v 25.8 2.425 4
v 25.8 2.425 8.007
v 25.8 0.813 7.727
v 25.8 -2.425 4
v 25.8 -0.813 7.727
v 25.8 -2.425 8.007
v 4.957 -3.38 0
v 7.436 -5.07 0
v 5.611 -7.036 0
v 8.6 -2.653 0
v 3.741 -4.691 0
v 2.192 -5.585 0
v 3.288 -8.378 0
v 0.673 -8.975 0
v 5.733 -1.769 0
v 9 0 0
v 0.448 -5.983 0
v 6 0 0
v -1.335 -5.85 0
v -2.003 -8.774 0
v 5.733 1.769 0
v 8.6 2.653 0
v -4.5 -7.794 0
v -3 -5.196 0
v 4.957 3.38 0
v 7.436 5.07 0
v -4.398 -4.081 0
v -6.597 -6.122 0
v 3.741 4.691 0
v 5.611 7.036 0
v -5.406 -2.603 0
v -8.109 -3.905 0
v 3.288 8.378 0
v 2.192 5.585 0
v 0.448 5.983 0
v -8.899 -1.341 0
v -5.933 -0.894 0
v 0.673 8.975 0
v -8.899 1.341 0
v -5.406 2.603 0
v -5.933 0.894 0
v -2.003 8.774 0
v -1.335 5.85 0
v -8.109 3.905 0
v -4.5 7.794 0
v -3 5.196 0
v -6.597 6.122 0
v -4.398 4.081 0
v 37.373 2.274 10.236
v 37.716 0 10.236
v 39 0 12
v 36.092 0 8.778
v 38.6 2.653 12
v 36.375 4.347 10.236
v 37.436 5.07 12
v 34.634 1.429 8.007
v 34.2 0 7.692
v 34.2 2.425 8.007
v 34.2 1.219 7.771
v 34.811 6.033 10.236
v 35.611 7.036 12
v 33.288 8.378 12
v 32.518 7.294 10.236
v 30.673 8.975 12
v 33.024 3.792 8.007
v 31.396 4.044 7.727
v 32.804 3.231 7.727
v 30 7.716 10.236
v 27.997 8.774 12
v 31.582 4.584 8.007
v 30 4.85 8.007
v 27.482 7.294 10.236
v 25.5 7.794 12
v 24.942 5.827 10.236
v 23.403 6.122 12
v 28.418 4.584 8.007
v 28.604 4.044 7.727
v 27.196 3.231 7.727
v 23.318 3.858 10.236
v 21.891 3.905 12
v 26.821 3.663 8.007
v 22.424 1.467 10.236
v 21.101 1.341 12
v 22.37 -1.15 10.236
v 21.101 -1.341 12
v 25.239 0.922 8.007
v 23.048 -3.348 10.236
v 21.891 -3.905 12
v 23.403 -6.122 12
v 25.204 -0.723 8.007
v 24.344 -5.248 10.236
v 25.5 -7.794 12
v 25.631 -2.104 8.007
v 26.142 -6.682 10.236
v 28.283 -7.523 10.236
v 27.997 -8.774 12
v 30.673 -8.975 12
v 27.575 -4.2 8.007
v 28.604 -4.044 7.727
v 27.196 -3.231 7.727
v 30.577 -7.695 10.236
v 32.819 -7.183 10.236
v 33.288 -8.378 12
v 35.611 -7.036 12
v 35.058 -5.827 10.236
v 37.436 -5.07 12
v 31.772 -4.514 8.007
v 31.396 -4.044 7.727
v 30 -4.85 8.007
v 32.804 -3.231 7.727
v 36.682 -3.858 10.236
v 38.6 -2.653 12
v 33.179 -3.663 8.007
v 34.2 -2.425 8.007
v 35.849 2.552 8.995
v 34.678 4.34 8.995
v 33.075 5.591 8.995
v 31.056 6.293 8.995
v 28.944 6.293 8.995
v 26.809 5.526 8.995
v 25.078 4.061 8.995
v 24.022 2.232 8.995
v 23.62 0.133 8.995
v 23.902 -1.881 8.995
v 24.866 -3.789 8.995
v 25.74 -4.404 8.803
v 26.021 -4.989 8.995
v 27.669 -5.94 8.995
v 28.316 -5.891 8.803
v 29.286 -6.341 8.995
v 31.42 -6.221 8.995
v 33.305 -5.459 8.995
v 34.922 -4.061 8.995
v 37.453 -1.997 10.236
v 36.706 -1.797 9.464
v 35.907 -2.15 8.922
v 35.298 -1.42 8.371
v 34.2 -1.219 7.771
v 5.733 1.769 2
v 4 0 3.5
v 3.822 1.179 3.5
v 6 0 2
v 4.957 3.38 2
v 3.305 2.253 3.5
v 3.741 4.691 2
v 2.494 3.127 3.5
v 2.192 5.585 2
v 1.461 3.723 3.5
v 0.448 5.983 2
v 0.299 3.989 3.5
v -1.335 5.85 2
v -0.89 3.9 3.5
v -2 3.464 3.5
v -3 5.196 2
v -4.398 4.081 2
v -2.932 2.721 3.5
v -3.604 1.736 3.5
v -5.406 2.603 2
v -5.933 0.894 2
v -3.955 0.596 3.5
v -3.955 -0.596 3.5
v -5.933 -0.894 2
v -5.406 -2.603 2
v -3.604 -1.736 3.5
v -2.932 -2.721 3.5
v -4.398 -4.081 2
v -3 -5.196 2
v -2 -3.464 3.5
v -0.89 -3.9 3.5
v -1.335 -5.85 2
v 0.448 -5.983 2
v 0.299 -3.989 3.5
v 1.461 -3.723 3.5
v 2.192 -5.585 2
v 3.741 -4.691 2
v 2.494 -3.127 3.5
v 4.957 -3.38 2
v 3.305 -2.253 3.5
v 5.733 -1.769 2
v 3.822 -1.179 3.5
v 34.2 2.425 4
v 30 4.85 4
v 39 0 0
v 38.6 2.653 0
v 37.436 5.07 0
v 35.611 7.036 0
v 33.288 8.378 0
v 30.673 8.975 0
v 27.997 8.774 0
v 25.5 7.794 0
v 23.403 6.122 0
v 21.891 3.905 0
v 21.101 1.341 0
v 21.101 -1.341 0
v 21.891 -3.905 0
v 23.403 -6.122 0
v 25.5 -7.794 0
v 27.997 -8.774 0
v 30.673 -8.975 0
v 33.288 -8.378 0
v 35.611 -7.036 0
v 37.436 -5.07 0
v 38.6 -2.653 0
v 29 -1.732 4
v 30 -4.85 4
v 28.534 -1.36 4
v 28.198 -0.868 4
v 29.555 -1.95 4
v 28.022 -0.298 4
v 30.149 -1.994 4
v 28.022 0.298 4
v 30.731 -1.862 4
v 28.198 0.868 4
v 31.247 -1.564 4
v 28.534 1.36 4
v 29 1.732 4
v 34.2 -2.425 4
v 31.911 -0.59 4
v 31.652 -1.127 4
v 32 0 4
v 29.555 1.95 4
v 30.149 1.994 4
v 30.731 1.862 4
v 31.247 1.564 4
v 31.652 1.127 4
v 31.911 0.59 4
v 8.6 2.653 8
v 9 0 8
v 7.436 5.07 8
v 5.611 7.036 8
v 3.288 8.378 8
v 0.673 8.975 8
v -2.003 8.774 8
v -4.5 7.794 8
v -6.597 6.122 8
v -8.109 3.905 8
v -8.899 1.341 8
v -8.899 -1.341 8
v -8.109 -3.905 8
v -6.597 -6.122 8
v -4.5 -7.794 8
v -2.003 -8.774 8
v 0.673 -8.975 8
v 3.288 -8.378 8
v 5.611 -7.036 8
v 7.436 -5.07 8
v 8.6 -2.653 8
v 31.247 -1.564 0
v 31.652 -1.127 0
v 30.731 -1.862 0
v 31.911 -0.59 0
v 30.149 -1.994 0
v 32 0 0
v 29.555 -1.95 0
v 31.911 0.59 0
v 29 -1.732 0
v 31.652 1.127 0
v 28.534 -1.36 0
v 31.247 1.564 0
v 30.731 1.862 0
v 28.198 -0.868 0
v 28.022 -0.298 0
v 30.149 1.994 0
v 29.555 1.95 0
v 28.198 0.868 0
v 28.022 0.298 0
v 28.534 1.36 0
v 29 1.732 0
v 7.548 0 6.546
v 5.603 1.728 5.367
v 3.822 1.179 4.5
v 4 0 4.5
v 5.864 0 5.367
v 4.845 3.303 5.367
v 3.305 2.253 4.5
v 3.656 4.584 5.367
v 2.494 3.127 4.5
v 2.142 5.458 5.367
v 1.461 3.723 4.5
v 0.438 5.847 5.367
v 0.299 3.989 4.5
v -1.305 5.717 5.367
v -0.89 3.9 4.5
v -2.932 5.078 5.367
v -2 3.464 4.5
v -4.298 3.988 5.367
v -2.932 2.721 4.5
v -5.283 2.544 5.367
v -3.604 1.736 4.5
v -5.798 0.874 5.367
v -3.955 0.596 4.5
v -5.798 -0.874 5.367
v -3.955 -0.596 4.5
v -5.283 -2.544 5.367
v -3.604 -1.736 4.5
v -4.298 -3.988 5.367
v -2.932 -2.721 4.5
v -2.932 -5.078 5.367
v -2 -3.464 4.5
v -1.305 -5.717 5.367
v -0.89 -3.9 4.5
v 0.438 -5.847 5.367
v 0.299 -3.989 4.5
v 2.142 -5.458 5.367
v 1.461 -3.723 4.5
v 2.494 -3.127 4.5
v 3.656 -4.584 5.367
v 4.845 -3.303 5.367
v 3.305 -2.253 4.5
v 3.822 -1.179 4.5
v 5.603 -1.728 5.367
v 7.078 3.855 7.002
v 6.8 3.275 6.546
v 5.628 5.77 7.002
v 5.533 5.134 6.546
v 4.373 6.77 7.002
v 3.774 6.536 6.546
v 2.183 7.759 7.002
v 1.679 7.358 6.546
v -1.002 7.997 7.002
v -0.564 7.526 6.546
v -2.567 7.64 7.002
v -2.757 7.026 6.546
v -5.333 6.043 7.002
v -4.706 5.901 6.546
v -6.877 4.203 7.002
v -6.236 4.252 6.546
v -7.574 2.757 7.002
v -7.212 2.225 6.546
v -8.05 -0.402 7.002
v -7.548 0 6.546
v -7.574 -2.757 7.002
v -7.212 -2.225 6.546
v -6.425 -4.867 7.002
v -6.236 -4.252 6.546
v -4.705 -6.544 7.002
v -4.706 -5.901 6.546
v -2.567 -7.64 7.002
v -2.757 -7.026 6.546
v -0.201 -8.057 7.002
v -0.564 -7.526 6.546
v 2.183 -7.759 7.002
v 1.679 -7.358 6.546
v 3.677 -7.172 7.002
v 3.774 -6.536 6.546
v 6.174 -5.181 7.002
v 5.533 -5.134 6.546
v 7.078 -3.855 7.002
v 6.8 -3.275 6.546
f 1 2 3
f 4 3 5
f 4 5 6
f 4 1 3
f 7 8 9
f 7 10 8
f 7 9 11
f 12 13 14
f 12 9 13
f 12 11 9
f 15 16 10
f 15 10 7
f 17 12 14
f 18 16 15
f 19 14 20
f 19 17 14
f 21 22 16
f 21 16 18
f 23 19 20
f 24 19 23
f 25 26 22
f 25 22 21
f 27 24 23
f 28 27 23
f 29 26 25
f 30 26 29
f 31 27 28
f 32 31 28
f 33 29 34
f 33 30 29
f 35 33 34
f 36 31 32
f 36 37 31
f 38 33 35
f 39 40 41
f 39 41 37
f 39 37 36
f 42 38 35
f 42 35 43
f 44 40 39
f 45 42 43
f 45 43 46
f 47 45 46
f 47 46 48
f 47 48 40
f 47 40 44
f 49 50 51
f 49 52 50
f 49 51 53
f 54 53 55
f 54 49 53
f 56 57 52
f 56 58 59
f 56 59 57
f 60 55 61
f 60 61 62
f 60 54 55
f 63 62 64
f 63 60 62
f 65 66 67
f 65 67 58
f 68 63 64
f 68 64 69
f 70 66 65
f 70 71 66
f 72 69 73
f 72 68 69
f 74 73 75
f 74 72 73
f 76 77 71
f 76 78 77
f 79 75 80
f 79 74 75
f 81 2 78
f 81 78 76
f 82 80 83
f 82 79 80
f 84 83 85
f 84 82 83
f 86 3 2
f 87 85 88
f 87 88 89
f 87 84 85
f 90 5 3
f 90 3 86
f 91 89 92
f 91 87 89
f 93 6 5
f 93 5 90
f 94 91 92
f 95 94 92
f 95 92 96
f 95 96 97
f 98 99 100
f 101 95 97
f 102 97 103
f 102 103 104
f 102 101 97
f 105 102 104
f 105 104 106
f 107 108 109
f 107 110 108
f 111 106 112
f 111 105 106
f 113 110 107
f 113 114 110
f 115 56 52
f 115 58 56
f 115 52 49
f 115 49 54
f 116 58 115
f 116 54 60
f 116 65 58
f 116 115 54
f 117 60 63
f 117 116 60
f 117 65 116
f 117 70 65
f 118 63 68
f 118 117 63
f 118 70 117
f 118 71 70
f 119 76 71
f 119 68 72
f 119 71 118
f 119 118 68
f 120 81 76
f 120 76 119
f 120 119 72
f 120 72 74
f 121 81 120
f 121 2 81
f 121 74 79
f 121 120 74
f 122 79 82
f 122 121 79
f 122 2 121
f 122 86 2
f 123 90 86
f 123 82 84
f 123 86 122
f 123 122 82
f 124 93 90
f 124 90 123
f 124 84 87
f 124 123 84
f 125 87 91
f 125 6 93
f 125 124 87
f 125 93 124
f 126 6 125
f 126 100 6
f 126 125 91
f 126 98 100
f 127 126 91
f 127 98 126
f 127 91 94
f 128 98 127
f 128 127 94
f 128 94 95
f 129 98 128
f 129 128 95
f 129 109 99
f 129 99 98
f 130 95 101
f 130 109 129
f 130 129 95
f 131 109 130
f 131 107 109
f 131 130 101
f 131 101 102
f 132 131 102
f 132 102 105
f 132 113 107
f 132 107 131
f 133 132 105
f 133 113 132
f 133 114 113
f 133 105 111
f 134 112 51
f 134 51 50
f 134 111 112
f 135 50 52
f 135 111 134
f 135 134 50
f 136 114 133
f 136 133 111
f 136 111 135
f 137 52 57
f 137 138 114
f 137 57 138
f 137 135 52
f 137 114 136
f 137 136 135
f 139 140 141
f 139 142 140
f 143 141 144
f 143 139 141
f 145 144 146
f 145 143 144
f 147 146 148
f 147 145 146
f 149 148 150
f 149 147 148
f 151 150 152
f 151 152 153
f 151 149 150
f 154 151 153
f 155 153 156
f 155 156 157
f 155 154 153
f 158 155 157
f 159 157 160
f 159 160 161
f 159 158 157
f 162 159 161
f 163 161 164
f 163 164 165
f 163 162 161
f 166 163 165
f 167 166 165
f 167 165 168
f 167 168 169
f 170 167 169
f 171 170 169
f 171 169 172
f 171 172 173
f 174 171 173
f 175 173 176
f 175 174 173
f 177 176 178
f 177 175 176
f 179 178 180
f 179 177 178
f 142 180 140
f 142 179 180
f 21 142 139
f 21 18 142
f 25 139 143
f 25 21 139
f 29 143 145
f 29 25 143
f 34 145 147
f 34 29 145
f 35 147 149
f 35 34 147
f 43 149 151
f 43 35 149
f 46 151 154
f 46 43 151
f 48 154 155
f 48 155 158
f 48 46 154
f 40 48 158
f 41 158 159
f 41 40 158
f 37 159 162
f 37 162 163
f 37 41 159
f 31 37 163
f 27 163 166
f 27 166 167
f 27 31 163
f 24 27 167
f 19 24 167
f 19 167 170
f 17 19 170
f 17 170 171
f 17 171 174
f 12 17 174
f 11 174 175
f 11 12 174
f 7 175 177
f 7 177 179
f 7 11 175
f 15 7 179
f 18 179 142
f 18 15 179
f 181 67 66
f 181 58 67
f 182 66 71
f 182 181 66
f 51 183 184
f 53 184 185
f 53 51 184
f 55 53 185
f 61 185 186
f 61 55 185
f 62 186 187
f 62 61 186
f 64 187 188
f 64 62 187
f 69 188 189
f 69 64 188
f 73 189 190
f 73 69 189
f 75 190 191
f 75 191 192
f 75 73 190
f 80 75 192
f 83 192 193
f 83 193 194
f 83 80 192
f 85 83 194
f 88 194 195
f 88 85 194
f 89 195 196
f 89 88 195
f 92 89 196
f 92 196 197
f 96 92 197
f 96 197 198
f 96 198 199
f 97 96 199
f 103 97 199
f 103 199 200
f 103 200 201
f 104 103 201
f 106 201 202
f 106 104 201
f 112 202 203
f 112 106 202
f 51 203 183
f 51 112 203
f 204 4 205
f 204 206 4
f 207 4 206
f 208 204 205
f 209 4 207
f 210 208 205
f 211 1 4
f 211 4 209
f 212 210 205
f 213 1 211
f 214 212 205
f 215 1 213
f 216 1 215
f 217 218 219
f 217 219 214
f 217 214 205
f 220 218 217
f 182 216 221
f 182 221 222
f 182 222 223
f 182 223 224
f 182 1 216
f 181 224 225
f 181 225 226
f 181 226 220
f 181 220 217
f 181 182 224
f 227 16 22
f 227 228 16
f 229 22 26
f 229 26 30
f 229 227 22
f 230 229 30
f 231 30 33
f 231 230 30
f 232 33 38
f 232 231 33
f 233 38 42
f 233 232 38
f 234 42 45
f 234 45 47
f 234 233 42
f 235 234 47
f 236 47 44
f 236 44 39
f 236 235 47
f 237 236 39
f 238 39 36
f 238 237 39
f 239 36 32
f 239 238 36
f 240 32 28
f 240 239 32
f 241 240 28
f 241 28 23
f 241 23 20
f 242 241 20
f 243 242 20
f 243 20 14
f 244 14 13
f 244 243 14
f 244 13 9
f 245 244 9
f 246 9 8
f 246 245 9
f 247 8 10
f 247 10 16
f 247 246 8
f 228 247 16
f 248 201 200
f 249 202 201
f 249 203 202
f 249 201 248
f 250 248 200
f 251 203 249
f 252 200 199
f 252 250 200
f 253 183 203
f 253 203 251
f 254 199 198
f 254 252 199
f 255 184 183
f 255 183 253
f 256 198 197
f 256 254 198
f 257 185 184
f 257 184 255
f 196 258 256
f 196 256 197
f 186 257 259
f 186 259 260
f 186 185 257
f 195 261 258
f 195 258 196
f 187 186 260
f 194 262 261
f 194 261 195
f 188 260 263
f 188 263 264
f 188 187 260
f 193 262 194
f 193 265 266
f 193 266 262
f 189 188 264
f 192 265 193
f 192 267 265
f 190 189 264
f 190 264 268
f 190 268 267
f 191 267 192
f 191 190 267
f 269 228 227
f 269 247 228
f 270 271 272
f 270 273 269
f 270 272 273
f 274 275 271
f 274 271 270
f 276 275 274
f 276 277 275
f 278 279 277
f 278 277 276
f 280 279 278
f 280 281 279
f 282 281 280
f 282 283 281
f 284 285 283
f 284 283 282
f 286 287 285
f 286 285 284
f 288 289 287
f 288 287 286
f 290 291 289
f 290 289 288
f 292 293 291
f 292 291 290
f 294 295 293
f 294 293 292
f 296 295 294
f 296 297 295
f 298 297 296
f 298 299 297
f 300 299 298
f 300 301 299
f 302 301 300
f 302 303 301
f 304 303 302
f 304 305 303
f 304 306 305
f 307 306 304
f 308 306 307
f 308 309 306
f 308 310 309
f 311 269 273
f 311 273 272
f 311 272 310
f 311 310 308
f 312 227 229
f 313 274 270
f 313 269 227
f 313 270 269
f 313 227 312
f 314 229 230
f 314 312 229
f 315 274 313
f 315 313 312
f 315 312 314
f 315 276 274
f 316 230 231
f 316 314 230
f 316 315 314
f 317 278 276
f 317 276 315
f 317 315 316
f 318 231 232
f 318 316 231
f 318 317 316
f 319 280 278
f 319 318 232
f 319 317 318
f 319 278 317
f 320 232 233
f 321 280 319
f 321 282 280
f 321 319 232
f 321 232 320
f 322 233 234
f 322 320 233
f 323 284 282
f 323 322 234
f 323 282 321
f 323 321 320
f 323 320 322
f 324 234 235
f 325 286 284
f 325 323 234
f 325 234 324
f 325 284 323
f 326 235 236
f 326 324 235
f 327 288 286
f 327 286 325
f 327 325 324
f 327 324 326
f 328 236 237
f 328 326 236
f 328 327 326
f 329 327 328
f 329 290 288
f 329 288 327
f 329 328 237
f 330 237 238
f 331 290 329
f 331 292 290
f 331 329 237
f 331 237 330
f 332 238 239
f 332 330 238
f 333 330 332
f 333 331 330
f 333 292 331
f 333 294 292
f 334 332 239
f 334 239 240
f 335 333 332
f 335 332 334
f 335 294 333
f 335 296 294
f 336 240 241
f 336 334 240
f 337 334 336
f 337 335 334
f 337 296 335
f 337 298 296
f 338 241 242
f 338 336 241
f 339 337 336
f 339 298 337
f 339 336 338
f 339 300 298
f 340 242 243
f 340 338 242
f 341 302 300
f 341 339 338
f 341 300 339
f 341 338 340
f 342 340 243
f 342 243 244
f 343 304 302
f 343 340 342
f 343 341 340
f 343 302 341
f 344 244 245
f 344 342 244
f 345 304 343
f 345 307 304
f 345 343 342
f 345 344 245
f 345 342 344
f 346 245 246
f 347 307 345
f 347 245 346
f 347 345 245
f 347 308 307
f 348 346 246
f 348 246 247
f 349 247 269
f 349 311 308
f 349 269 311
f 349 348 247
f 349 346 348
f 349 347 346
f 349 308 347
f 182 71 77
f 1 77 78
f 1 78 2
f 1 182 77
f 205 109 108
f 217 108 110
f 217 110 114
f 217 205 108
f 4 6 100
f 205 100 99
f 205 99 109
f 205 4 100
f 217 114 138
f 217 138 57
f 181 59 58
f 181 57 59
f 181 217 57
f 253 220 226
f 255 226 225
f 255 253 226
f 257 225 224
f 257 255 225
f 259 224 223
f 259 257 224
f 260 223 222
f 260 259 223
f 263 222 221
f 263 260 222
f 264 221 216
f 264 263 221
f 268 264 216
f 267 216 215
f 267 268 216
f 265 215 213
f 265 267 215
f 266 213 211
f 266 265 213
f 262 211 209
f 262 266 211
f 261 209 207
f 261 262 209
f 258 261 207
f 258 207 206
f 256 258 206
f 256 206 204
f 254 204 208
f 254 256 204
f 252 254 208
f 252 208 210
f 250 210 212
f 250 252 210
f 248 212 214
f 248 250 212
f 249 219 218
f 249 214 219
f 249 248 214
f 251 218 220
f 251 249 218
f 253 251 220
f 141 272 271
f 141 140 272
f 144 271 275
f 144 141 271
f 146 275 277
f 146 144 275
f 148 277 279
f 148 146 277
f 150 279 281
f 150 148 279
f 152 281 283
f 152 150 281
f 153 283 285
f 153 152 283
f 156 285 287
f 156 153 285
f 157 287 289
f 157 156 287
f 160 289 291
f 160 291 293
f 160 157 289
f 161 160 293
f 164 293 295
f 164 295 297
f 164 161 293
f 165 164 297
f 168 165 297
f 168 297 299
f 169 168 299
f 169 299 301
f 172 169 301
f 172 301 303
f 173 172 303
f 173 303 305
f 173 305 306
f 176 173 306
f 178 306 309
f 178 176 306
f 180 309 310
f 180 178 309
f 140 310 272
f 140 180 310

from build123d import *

# Parameters (mm, degrees)
F7_DEPTH = 5


with BuildPart() as f2:
    # F0 (on Front) → F2 (revolve)
    with BuildSketch(Plane.XZ):
        with BuildLine():
            Line((6, 2), (6, 0))
            Line((6, 0), (9, 0))
            Line((9, 0), (9, 8))
            ThreePointArc((9, 8), (6.731456, 5.919349), (4, 4.5))
            Line((4, 4.5), (4, 3.5))
            Line((4, 3.5), (6, 2))
        make_face()
    revolve(axis=Axis((0, 0, 8.674054), (0, 0, 1)))


with BuildPart() as f5:
    # F4 (on Front) → F5 (revolve)
    with BuildSketch(Plane.XZ):
        with BuildLine():
            Line((32, 7), (32, 0))
            Line((32, 0), (39, 0))
            Line((39, 0), (39, 12))
            ThreePointArc((39, 12), (36.041523, 8.741868), (32, 7))
        make_face()
    revolve(axis=Axis((30, 0, 15), (0, 0, 1)))


with BuildPart() as f7:
    # F6 (on Top) → F7 (new body)
    with BuildSketch(Plane.XY):
        Polygon((34.2, -2.424871), (34.2, 2.424871), (30, 4.849742), (25.8, 2.424871), (25.8, -2.424871), (30, -4.849742), align=None)
    extrude(amount=F7_DEPTH)


with BuildPart() as f7_1:
    # F8: moved
    add(f7.part.moved(Location((0, 0, 4))))


with BuildPart() as f5_1:
    add(f5.part)

    # F9: cut F7
    add(f7_1.part, mode=Mode.SUBTRACT)


solid = Compound([f2.part, f5_1.part])
